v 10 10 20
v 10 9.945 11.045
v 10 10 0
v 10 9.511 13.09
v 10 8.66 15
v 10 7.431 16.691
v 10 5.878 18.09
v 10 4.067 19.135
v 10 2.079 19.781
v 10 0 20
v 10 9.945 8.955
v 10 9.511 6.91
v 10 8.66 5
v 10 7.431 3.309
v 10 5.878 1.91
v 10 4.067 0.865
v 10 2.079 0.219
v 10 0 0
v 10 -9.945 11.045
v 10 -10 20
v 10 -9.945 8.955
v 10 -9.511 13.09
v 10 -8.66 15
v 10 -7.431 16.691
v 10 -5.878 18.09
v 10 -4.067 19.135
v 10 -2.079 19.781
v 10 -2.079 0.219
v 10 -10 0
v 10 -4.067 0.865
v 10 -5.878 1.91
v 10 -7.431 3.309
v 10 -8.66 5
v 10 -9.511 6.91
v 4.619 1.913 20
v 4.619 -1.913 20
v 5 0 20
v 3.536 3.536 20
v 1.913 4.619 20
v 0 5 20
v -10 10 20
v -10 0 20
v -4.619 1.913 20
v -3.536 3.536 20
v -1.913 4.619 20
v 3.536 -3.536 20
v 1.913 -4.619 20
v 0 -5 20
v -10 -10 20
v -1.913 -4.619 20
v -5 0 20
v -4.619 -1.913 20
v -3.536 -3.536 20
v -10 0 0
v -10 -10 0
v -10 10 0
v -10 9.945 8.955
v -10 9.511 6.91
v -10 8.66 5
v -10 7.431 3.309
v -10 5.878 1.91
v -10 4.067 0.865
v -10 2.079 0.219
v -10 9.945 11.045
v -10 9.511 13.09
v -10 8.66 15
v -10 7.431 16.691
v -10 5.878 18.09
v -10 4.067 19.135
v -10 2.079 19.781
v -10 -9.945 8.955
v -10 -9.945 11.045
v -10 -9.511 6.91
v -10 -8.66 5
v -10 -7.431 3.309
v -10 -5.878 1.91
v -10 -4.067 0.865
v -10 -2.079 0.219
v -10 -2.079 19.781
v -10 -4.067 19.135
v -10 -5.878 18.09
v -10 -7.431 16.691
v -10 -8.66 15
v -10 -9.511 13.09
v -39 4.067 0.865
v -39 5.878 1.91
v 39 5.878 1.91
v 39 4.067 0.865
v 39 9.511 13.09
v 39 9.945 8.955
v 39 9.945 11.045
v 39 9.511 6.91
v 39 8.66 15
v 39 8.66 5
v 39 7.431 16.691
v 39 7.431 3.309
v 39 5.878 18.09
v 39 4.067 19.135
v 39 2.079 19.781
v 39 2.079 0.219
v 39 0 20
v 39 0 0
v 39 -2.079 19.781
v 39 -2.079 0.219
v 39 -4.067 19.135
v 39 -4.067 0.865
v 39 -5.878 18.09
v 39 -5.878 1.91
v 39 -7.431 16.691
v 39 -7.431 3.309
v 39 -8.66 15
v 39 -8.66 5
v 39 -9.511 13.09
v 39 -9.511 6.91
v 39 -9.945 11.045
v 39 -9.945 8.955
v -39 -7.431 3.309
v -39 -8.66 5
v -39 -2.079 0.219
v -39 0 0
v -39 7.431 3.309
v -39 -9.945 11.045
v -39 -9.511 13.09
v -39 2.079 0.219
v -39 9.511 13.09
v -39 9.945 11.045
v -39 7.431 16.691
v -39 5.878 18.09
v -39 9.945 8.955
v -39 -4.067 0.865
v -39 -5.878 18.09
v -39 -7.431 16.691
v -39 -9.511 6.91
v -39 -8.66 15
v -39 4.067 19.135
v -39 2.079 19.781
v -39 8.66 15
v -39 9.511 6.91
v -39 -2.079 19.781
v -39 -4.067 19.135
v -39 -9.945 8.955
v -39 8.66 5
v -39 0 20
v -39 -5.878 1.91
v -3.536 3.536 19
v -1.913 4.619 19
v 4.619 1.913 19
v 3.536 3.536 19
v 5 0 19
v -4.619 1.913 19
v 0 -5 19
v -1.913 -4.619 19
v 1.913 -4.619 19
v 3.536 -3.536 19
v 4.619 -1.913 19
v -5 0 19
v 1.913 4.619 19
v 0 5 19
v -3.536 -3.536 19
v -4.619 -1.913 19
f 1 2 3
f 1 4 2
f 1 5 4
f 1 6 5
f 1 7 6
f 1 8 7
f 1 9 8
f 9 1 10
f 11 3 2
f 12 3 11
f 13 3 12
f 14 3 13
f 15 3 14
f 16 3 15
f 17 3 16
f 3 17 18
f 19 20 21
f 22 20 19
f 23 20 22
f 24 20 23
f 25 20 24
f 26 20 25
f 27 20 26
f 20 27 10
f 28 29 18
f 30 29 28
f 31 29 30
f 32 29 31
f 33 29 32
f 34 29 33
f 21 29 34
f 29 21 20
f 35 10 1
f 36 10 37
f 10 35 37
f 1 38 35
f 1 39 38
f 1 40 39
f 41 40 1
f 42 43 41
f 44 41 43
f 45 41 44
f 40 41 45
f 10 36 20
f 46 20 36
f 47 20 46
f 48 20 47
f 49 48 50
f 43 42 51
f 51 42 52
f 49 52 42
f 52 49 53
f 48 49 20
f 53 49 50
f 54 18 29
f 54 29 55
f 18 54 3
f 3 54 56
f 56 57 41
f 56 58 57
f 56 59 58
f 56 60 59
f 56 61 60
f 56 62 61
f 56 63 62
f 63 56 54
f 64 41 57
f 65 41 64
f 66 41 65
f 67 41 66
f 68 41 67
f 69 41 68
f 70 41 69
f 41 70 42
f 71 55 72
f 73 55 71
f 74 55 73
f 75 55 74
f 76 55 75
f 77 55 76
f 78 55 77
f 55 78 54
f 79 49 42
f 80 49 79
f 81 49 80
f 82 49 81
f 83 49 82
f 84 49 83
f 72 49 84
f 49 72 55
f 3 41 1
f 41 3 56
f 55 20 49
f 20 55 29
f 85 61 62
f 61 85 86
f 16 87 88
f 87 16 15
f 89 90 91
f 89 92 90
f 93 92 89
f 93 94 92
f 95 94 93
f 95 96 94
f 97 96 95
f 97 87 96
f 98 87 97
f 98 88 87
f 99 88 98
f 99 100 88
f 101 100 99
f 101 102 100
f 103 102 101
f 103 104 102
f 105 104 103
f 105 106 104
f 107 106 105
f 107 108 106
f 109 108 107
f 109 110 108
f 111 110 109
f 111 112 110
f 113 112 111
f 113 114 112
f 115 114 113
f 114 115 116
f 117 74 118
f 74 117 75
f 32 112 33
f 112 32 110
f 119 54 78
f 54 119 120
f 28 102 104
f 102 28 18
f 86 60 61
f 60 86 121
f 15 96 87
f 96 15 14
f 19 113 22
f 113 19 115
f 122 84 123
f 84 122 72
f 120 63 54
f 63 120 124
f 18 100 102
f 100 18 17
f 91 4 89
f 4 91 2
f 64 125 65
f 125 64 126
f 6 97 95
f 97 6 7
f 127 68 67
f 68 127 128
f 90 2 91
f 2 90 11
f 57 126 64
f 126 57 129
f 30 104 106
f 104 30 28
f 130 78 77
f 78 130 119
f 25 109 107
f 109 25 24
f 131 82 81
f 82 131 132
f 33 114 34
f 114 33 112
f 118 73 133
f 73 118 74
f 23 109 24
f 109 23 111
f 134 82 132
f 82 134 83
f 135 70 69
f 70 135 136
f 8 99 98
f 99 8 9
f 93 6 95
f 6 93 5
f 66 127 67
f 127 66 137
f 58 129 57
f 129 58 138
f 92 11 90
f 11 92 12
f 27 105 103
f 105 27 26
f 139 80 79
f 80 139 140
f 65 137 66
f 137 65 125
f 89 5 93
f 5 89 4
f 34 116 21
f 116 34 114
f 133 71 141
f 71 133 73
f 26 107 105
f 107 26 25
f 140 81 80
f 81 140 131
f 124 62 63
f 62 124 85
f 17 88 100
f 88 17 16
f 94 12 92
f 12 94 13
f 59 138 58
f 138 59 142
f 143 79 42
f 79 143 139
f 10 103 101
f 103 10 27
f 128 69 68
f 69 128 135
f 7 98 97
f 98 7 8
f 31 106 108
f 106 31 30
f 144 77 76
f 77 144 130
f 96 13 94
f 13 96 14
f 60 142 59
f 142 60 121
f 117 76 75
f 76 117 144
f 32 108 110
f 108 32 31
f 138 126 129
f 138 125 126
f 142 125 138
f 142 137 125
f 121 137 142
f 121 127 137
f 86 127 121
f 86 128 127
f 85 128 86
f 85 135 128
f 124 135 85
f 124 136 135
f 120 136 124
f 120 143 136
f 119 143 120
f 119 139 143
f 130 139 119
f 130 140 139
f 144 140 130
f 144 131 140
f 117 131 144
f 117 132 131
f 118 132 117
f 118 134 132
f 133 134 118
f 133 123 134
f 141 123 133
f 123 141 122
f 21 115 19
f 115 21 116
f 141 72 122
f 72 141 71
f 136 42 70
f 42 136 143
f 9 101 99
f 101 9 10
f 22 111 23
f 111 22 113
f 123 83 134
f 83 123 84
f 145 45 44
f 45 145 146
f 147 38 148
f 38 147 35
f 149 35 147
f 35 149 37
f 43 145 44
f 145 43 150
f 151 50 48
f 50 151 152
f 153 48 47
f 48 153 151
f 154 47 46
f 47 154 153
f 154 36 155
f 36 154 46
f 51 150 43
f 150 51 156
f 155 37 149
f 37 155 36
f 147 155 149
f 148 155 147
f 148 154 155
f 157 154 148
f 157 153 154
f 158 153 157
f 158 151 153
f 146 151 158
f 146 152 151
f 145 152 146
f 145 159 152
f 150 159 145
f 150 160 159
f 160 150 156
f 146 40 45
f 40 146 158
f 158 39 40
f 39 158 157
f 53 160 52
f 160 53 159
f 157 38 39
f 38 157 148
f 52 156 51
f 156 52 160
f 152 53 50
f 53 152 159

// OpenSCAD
cube_size = 20; // [10:Small,20:Medium,30:Large]

hole_diameter = 10; 
hole_radius = hole_diameter/2;

// How deep should the center hole be?
hole_depth = 1; // [0,1,5,50]

show_wheels = "yes"; // [yes,no]

// How thick should the side wheels be?
wheel_thickness = 29; // [1:40]

// ignore this variable!
// foo=1;

// don't turn functions into params!
function BEZ03(u) = pow((1-u), 3);

// ignore variable values
bing = 3+4;
baz = 3 / hole_depth;

difference() {
  union() {
    translate([0, 0, cube_size/2]) cube([cube_size,cube_size,cube_size], center=true);
    if (show_wheels == "yes") {
      translate([0, 0, cube_size/2]) rotate([0, 90, 0]) {
        cylinder(r=cube_size/2, h=cube_size+(wheel_thickness*2), center=true);
      }
    }
  }
  translate([0, 0, cube_size-hole_depth]) cylinder(r=hole_radius, h=hole_depth);
}
        
